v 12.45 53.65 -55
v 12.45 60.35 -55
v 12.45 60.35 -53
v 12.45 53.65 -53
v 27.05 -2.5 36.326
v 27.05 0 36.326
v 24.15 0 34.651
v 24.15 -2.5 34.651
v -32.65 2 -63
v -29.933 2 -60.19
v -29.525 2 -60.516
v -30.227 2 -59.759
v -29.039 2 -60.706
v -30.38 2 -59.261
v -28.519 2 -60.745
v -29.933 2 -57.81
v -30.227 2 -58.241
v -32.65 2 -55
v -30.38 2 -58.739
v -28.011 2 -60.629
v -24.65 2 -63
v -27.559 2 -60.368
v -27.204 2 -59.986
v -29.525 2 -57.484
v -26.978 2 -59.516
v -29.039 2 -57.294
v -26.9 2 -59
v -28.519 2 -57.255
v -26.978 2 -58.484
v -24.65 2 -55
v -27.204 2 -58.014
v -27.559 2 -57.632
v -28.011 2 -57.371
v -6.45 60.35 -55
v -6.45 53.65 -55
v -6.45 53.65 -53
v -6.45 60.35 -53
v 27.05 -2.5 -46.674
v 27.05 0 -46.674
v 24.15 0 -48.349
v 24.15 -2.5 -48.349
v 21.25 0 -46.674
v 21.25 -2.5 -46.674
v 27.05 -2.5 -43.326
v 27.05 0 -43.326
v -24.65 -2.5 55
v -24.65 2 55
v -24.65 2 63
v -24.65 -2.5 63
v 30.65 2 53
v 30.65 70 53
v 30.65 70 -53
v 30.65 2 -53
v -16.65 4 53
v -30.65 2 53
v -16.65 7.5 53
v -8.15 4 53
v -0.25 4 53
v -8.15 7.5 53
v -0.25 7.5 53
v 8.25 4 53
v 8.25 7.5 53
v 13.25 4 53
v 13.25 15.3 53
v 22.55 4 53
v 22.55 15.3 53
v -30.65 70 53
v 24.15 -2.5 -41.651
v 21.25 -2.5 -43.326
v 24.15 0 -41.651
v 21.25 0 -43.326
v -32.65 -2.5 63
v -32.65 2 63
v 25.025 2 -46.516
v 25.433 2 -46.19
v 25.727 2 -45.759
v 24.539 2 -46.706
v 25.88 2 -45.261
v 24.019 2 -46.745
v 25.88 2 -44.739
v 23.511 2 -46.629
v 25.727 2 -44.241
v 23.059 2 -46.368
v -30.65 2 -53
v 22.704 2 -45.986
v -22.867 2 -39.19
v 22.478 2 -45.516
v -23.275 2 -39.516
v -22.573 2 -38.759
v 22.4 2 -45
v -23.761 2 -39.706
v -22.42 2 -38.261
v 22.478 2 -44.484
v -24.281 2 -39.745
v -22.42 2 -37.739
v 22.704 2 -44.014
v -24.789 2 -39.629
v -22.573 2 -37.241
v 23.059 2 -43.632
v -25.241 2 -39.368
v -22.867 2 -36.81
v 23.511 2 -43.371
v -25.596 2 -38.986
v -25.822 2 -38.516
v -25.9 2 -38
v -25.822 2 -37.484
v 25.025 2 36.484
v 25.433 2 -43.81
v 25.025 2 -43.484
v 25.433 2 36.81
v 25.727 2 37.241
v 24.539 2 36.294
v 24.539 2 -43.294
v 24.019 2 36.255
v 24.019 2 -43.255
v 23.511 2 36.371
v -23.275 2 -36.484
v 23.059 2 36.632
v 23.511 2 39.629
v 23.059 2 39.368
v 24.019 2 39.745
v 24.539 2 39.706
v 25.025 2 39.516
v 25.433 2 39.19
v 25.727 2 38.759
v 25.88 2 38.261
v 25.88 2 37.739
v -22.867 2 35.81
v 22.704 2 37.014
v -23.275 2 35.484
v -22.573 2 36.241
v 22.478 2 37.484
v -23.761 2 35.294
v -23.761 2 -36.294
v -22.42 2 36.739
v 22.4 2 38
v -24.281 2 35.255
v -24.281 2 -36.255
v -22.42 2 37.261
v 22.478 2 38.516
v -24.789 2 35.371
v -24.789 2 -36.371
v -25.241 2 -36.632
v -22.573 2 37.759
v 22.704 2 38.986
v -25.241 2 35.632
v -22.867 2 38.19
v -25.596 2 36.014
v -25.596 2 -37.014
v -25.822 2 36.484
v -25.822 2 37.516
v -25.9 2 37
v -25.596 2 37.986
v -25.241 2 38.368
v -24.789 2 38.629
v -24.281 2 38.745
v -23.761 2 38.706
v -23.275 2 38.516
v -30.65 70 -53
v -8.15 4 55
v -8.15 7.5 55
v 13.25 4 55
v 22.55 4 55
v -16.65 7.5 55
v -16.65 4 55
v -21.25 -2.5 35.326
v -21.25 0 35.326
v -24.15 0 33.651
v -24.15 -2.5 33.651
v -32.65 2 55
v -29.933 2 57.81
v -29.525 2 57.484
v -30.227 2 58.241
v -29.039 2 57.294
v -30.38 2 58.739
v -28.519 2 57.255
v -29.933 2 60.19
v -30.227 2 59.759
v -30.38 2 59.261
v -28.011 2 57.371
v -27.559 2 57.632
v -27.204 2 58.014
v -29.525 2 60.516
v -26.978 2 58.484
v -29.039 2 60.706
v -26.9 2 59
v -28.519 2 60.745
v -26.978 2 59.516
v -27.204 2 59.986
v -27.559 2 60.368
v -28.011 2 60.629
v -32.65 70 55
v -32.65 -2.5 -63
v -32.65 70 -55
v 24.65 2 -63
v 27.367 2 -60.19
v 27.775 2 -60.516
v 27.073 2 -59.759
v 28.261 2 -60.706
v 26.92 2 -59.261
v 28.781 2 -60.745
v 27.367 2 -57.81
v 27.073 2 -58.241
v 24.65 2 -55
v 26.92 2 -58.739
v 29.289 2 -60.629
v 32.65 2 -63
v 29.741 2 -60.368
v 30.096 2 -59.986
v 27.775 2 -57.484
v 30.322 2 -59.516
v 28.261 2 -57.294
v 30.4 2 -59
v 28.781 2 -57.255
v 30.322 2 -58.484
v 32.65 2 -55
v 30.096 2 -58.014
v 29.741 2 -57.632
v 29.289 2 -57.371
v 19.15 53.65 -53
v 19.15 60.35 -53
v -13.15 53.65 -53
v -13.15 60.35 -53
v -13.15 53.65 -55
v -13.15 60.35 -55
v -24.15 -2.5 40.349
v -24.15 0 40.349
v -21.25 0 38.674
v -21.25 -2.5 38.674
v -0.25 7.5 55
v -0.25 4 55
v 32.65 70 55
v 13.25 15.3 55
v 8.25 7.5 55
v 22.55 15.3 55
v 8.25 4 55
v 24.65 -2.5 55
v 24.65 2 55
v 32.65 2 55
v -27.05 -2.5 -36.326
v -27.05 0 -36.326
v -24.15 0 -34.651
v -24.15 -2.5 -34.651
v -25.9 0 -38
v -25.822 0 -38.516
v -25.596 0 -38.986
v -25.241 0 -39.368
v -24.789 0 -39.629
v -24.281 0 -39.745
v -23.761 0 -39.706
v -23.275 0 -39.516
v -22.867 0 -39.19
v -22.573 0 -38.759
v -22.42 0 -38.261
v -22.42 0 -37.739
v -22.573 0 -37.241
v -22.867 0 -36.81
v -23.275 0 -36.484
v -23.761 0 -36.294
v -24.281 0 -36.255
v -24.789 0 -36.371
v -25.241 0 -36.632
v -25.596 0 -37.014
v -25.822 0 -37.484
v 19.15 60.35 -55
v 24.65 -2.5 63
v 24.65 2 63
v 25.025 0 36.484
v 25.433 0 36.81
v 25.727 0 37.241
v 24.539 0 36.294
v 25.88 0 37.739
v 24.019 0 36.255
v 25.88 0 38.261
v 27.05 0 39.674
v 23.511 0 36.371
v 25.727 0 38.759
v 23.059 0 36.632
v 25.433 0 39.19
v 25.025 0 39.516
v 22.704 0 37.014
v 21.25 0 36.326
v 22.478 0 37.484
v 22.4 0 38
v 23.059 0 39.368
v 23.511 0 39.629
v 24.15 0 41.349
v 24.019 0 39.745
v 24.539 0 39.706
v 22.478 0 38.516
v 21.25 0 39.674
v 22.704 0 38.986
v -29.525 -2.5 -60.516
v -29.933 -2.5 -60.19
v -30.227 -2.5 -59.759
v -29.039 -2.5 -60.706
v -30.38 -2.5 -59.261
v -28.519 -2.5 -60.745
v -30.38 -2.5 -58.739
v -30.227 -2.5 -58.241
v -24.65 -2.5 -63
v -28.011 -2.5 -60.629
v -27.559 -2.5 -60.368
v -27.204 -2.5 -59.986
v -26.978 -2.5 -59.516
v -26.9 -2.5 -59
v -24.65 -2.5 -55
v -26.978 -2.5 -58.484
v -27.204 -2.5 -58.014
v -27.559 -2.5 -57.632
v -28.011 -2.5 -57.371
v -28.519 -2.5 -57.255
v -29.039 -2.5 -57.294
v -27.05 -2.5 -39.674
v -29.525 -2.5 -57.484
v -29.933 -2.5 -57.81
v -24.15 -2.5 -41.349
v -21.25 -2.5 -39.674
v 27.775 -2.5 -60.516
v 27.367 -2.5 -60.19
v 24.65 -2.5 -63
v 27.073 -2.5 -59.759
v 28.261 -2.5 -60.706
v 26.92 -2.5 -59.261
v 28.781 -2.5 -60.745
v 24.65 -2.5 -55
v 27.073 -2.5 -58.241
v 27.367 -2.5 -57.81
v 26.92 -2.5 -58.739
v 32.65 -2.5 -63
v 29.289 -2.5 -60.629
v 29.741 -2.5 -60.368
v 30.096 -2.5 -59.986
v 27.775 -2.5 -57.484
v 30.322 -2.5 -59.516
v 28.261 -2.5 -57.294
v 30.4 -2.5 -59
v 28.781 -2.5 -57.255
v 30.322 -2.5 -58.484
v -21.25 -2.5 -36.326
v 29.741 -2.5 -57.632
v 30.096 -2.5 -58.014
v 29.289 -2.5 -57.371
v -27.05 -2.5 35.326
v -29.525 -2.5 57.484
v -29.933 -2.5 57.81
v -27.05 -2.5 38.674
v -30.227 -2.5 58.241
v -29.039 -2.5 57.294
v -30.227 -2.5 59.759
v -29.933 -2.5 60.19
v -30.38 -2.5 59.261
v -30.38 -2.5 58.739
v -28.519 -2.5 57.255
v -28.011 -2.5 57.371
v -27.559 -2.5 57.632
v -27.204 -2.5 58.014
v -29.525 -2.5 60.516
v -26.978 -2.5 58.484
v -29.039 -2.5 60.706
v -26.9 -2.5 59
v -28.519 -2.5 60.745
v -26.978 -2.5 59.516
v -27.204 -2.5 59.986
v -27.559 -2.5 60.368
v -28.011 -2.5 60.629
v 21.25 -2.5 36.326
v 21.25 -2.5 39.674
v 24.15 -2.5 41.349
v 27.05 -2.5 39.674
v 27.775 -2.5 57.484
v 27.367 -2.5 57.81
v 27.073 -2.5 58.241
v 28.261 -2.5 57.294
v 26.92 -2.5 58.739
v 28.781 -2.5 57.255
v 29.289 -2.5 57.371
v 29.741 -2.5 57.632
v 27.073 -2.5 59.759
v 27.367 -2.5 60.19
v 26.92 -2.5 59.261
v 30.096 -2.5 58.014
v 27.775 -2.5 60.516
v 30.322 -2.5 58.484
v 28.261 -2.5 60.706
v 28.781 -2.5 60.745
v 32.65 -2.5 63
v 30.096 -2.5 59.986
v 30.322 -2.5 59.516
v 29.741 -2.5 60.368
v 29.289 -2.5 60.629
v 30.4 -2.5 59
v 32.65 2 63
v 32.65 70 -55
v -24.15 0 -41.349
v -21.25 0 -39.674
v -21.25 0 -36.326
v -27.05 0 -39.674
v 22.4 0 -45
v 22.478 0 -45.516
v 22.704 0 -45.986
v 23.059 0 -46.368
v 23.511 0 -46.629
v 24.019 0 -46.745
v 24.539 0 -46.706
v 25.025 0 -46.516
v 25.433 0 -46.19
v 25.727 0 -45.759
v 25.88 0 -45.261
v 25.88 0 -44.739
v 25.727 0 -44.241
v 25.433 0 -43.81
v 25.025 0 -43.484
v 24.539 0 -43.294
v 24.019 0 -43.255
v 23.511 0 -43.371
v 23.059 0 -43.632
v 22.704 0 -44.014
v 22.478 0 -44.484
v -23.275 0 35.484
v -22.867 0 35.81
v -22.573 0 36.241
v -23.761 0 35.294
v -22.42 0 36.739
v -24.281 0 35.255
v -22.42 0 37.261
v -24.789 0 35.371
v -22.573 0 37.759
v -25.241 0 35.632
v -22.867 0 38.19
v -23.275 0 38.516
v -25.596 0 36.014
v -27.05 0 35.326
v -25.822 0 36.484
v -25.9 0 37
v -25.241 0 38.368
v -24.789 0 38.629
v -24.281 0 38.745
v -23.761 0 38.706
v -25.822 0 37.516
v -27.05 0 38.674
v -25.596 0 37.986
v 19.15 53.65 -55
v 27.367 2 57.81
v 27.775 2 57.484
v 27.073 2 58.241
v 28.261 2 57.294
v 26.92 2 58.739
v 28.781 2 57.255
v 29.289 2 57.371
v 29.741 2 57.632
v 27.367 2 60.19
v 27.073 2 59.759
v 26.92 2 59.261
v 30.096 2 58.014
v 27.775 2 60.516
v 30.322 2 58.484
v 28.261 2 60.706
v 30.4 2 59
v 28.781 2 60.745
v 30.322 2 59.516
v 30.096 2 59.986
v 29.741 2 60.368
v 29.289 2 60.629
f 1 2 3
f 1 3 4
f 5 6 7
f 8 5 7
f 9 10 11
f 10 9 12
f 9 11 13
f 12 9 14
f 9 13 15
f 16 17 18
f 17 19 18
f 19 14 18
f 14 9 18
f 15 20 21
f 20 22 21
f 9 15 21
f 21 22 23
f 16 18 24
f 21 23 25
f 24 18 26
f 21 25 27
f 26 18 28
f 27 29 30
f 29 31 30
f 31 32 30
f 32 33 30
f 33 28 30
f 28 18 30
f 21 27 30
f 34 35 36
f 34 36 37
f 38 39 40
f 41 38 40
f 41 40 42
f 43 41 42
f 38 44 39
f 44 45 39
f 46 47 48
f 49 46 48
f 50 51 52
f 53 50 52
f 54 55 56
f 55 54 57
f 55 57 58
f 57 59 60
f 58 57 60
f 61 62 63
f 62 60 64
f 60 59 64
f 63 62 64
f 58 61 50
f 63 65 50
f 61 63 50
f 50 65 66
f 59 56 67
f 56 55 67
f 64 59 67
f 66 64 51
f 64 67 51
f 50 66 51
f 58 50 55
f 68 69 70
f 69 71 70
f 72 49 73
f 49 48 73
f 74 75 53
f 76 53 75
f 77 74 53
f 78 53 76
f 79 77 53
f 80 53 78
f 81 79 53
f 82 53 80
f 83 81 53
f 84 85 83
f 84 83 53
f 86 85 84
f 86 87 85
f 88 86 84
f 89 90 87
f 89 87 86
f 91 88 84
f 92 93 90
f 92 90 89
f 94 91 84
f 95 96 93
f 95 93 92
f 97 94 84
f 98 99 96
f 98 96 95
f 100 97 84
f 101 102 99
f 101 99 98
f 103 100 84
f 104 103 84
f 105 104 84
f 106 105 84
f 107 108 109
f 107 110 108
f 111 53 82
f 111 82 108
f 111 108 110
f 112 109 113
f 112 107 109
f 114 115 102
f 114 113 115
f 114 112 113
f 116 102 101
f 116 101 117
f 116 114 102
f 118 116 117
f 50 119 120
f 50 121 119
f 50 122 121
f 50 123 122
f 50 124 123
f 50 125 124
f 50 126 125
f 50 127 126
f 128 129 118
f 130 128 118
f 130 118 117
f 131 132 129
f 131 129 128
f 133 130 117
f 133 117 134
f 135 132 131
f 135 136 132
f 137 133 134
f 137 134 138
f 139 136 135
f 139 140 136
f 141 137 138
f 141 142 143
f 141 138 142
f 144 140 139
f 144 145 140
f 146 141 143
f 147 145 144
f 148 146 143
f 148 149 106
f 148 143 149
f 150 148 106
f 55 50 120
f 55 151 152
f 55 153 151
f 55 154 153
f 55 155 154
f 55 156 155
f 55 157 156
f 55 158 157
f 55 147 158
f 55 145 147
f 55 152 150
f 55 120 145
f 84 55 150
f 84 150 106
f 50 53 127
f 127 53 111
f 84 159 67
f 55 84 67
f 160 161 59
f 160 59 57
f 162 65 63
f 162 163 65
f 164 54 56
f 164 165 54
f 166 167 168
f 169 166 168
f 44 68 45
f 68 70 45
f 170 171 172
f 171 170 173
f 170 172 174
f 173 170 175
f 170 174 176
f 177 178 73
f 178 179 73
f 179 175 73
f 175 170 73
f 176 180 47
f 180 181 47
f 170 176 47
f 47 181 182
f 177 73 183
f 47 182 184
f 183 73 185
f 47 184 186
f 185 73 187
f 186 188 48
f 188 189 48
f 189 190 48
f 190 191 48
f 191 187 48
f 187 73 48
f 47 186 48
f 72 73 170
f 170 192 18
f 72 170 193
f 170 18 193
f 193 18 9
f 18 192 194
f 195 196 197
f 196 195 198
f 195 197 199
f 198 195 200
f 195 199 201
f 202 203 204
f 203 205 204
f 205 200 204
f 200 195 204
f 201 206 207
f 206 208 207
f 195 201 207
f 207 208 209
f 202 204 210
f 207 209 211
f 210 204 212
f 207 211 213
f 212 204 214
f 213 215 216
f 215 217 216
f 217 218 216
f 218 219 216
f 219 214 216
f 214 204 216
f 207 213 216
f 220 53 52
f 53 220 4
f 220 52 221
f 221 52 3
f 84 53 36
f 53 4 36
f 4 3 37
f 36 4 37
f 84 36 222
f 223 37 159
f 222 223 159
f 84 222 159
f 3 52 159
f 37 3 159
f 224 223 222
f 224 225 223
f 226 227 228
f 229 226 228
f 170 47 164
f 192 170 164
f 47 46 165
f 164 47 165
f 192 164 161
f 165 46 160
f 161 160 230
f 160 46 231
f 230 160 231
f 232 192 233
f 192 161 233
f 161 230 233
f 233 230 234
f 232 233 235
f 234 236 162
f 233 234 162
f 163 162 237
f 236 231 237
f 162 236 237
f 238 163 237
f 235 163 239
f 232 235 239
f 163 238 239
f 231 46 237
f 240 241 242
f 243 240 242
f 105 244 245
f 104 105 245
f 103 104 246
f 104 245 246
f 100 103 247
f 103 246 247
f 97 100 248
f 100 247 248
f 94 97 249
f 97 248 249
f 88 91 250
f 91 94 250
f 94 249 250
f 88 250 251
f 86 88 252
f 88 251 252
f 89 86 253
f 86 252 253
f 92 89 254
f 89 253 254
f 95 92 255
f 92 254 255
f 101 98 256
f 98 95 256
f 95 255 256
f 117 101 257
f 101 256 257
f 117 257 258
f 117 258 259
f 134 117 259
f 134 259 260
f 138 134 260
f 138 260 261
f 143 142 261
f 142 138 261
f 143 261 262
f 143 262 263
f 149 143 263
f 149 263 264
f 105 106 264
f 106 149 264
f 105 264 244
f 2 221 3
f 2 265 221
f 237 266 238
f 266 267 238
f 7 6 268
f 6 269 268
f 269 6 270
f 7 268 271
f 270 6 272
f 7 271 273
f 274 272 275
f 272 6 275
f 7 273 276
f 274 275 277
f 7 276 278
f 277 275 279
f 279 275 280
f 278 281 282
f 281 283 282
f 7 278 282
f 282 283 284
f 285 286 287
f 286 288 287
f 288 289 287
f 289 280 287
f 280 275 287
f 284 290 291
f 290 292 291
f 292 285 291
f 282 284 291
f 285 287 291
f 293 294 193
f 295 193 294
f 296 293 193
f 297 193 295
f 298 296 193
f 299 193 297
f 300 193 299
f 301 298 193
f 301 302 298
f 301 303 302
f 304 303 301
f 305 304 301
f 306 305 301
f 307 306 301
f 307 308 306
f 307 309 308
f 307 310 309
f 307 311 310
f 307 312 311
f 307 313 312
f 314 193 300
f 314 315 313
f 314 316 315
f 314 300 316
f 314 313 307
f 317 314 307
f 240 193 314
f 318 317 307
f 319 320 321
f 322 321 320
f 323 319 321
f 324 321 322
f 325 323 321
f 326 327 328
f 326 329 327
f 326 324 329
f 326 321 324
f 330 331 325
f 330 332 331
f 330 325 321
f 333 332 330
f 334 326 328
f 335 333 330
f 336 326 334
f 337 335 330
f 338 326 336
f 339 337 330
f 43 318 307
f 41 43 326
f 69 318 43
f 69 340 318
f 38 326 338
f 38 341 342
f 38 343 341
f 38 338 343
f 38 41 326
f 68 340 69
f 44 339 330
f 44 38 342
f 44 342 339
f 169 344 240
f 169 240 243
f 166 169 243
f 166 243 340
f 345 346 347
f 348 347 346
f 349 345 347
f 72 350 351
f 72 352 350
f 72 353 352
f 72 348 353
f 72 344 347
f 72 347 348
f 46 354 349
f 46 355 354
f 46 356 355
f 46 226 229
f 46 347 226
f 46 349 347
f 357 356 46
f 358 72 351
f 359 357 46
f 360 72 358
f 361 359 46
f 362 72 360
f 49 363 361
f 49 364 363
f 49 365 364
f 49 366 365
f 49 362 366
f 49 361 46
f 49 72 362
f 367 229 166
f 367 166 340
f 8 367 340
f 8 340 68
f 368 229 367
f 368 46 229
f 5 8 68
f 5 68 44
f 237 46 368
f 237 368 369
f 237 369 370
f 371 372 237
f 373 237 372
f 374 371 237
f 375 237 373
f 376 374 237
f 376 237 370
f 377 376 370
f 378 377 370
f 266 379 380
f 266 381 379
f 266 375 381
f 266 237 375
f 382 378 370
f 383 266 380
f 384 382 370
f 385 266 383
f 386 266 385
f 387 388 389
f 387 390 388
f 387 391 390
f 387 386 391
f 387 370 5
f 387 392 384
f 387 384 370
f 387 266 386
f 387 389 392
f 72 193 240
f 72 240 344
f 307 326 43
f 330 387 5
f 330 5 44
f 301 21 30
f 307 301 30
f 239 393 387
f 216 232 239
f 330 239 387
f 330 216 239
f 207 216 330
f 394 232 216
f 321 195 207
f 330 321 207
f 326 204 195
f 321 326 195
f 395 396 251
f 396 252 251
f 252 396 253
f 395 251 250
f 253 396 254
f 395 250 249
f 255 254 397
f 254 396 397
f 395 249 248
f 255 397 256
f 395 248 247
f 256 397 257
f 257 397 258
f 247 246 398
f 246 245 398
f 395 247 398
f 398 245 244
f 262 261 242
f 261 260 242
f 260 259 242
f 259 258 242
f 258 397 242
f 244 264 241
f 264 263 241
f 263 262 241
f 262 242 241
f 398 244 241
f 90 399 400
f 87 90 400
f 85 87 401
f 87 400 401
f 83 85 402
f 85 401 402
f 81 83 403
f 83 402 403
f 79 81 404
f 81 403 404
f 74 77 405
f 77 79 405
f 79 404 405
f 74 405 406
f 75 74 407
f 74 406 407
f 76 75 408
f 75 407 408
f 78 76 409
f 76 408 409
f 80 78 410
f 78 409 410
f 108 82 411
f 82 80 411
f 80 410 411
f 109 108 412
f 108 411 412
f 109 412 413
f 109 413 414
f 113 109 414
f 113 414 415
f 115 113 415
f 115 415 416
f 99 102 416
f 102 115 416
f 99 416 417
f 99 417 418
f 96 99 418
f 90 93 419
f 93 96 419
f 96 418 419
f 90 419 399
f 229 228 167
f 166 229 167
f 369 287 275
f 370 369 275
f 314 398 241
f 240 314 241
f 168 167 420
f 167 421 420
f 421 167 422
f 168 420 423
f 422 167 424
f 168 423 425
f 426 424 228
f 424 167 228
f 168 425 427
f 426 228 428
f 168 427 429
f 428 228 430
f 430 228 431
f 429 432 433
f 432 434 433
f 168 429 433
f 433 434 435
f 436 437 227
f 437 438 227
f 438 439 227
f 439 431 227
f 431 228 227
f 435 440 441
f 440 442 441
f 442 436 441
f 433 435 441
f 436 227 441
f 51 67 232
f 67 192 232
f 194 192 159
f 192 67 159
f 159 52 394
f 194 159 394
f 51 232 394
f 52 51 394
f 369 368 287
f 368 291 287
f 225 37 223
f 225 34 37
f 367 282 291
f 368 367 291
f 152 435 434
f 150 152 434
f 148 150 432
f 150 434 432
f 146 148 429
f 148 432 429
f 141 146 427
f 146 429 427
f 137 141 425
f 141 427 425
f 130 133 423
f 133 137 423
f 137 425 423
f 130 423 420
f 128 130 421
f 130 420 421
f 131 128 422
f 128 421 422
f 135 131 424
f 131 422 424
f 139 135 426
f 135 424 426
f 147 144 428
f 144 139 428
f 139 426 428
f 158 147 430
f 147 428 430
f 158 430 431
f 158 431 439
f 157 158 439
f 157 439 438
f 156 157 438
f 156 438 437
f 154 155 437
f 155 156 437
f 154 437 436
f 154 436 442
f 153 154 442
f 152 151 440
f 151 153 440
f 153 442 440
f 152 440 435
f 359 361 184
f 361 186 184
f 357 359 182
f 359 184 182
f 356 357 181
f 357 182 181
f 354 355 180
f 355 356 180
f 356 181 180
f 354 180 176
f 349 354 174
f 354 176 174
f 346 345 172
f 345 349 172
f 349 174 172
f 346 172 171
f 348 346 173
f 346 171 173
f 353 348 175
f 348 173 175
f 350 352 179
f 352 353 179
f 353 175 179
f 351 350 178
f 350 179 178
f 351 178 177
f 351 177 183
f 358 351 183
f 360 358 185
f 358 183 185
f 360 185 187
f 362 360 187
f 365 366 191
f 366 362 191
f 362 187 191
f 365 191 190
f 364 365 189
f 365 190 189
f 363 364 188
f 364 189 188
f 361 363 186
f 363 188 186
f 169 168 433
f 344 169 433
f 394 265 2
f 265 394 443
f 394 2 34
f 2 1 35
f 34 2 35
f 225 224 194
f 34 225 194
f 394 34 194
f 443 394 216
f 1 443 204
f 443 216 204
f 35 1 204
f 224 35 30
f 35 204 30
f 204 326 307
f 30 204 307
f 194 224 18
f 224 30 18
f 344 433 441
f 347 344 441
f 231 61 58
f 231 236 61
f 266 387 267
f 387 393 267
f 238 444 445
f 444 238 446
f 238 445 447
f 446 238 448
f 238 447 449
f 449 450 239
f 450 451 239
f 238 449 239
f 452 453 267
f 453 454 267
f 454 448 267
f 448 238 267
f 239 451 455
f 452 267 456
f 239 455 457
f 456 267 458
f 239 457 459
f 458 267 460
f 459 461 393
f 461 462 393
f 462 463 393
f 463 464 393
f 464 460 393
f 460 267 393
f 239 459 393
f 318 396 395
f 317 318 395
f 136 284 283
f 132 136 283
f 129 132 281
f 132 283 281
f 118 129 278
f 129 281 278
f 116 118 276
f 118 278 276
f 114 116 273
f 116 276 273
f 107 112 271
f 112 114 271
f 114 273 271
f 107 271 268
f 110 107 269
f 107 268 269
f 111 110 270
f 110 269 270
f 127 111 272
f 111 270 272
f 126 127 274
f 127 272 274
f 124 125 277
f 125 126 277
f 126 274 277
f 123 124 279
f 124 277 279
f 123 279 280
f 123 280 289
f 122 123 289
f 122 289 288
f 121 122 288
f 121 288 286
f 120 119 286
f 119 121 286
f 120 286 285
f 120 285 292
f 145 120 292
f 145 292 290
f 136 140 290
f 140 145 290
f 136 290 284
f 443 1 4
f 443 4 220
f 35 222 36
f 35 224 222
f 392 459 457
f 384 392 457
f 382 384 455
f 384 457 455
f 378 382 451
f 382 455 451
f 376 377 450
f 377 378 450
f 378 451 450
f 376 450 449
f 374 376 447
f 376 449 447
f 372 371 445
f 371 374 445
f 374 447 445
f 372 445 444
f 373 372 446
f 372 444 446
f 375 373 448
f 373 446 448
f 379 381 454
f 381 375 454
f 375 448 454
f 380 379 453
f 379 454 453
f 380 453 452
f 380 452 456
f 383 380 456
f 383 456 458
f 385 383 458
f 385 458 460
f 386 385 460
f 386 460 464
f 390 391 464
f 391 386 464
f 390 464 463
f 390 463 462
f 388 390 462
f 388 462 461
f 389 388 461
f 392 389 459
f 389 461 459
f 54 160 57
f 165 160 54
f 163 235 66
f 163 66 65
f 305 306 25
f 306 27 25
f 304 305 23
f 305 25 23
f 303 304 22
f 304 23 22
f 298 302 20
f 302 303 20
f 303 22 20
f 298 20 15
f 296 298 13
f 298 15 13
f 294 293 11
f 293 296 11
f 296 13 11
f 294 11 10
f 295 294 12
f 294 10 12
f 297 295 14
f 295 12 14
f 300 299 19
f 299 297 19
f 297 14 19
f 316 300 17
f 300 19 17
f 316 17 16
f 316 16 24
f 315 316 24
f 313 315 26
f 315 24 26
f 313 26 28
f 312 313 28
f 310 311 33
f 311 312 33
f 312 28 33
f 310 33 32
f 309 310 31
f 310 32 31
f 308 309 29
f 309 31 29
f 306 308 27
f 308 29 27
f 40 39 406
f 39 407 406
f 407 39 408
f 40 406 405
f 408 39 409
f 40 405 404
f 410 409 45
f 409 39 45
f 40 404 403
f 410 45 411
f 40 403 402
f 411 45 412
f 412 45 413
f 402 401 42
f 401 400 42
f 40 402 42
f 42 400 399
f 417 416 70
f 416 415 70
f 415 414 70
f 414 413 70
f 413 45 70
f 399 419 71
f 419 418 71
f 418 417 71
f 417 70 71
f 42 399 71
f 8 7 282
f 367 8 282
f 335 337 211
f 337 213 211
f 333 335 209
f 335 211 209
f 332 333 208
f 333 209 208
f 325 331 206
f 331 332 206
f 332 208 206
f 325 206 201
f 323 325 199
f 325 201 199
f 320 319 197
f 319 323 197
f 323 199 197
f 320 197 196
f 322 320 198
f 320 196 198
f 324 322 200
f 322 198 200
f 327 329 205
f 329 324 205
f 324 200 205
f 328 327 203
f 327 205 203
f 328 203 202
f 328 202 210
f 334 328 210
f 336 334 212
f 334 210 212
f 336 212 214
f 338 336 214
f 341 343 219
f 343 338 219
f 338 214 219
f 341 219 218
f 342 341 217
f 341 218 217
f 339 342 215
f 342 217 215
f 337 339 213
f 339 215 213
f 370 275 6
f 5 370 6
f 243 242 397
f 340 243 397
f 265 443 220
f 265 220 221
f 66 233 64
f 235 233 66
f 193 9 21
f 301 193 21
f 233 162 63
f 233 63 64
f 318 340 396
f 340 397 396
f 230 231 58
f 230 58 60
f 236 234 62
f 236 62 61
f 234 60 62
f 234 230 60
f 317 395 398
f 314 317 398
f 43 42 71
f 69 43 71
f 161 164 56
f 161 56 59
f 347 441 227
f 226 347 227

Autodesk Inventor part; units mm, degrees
ref_plane "YZ Plane" through (0, 0, 0) normal (1, 0, 0) x (0, 1, 0)
ref_plane "XZ Plane" through (0, 0, 0) normal (0, 1, 0) x (-1, 0, 0)
ref_plane "XY Plane" through (0, 0, 0) normal (0, 0, 1) x (1, 0, 0)
sketch "Sketch1" plane through (0, 0, 0) normal (0, 1, 0) x (-1, 0, 0)
  line L0 (32.65, 55) -> (-32.65, 55)
  line L1 (-32.65, 55) -> (-32.65, -55)
  line L2 (-32.65, -55) -> (32.65, -55)
  line L3 (32.65, -55) -> (32.65, 55)
  line L4 (32.65, 55) -> (-32.65, -55) construction
  line L5 (-32.65, 55) -> (32.65, -55) construction
  circle A0 centre (-24.15, 38) radius 1.75
  circle A1 centre (-24.15, -45) radius 1.75
  circle A2 centre (24.15, 37) radius 1.75
  circle A3 centre (24.15, -38) radius 1.75
  point P0 (0, 0)
  dimension "d0" = 110
  dimension "d1" = 65.3
  dimension "d2" = 83
  dimension "d3" = 8.5
  dimension "d4" = 17
  dimension "d5" = 3.5
  dimension "d6" = 3.5
  dimension "d7" = 3.5
  dimension "d8" = 1
  dimension "d9" = 48.3
  dimension "d10" = 3.5
  dimension "d11" = 75
extrude "Extrusion1" add sketch "Sketch1" along normal blind 2
sketch "Sketch2" plane through (-32.65, 0, 55) normal (0, 0, 1) x (1, 0, 0)
  line L0 (0, 70) -> (65.3, 70)
  line L1 (65.3, 70) -> (65.3, 0)
  line L2 (65.3, 0) -> (0, 0)
  line L3 (0, 0) -> (0, 70)
  line L4 (0, 70) -> (65.3, 0) construction
  line L5 (65.3, 70) -> (0, 0) construction
  line L6 (65.3, 0) -> (65.3, 2) projected
  line L7 (16, 7.5) -> (24.5, 7.5)
  line L8 (24.5, 7.5) -> (24.5, 4)
  line L9 (24.5, 4) -> (16, 4)
  line L10 (16, 4) -> (16, 7.5)
  line L11 (16, 7.5) -> (24.5, 4) construction
  line L12 (24.5, 7.5) -> (16, 4) construction
  line L13 (32.4, 7.5) -> (40.9, 7.5)
  line L14 (40.9, 7.5) -> (40.9, 4)
  line L15 (40.9, 4) -> (32.4, 4)
  line L16 (32.4, 4) -> (32.4, 7.5)
  line L17 (32.4, 7.5) -> (40.9, 4) construction
  line L18 (40.9, 7.5) -> (32.4, 4) construction
  line L19 (45.9, 15.3) -> (55.2, 15.3)
  line L20 (55.2, 15.3) -> (55.2, 4)
  line L21 (55.2, 4) -> (45.9, 4)
  line L22 (45.9, 4) -> (45.9, 15.3)
  line L23 (45.9, 15.3) -> (55.2, 4) construction
  line L24 (55.2, 15.3) -> (45.9, 4) construction
  line L25 (0, 2) -> (65.3, 2) projected
  point P0 (32.65, 0)
  point P1 (32.65, 35)
  point P2 (20.25, 5.75)
  point P3 (36.65, 5.75)
  point P4 (50.55, 9.65)
  point P5 (45.9, 9.65)
  dimension "d14" = 70
  dimension "d15" = 11.3
  dimension "d16" = 9.3
  dimension "d17" = 8.5
  dimension "d18" = 3.5
  dimension "d19" = 8.5
  dimension "d20" = 3.5
  dimension "d21" = 2
  dimension "d22" = 7.9
  dimension "d23" = 16
  dimension "d24" = 5
extrude "Extrusion2" add sketch "Sketch2" against normal blind 2 contours L0 L1 L25 L3
sketch "Sketch3" plane through (32.65, 0, 55) normal (1, 0, 0) x (0, 0, -1)
  line L0 (110, 0) -> (110, 2) projected
  line L1 (0, 70) -> (110, 70)
  line L2 (110, 70) -> (110, 0)
  line L3 (110, 0) -> (0, 0)
  line L4 (0, 0) -> (0, 70)
  line L5 (0, 70) -> (110, 0) construction
  line L6 (110, 70) -> (0, 0) construction
  point P0 (55, 0)
  point P1 (55, 35)
  point P2 (0, 70)
extrude "Extrusion3" add sketch "Sketch3" against normal blind 2
sketch "Sketch4" plane through (-32.65, 0, -55) normal (-1, 0, 0) x (0, 0, 1)
  line L0 (110, 0) -> (110, 70) projected
  line L1 (0, 70) -> (110, 70)
  line L2 (110, 70) -> (110, 0)
  line L3 (110, 0) -> (0, 0)
  line L4 (0, 0) -> (0, 70)
  line L5 (0, 70) -> (110, 0) construction
  line L6 (110, 70) -> (0, 0) construction
  point P0 (55, 0)
  point P1 (55, 35)
  point P2 (0, 70)
extrude "Extrusion4" add sketch "Sketch4" against normal blind 2
sketch "Sketch5" plane through (32.65, 0, -55) normal (0, 0, -1) x (-1, 0, 0)
  line L0 (65.3, 0) -> (65.3, 70) projected
  line L1 (0, 70) -> (65.3, 70)
  line L2 (65.3, 70) -> (65.3, 0)
  line L3 (65.3, 0) -> (0, 0)
  line L4 (0, 0) -> (0, 70)
  line L5 (0, 70) -> (65.3, 0) construction
  line L6 (65.3, 70) -> (0, 0) construction
  line L7 (13.5, 60.35) -> (20.2, 60.35)
  line L8 (20.2, 60.35) -> (20.2, 53.65)
  line L9 (20.2, 53.65) -> (13.5, 53.65)
  line L10 (13.5, 53.65) -> (13.5, 60.35)
  line L11 (13.5, 60.35) -> (20.2, 53.65) construction
  line L12 (20.2, 60.35) -> (13.5, 53.65) construction
  line L13 (39.1, 60.35) -> (45.8, 60.35)
  line L14 (45.8, 60.35) -> (45.8, 53.65)
  line L15 (45.8, 53.65) -> (39.1, 53.65)
  line L16 (39.1, 53.65) -> (39.1, 60.35)
  line L17 (39.1, 60.35) -> (45.8, 53.65) construction
  line L18 (45.8, 60.35) -> (39.1, 53.65) construction
  line L19 (2, 2) -> (63.3, 2) projected
  point P0 (32.65, 0)
  point P1 (32.65, 35)
  point P2 (16.85, 57)
  point P3 (42.45, 57)
  point P4 (20.2, 57)
  point P5 (39.1, 57)
  point P6 (45.8, 57)
  dimension "d31" = 6.7
  dimension "d32" = 6.7
  dimension "d33" = 6.7
  dimension "d34" = 6.7
  dimension "d35" = 18.9
  dimension "d36" = 13.5
  dimension "d38" = 55
  dimension "d39" = 19.5
extrude "Extrusion5" add sketch "Sketch5" against normal blind 2
sketch "Sketch6" plane through (0, 0, 0) normal (0, -1, 0) x (1, 0, 0)
  line L0 (-32.65, -55) -> (32.65, -55) projected
  line L1 (-24.65, -63) -> (-32.65, -63)
  line L2 (-32.65, -63) -> (-32.65, -55)
  line L3 (-32.65, -55) -> (-24.65, -55)
  line L4 (-24.65, -55) -> (-24.65, -63)
  line L5 (-24.65, -63) -> (-32.65, -55) construction
  line L6 (-32.65, -63) -> (-24.65, -55) construction
  line L7 (0, 0) -> (-42.6536, 0) construction
  line L8 (0, 0) -> (0, 77.6951) construction
  line L9 (-24.65, 63) -> (-32.65, 63)
  line L10 (-32.65, 63) -> (-32.65, 55)
  line L11 (-32.65, 55) -> (-24.65, 55)
  line L12 (-24.65, 55) -> (-24.65, 63)
  line L13 (-24.65, 63) -> (-32.65, 55) construction
  line L14 (-32.65, 63) -> (-24.65, 55) construction
  line L15 (24.65, -63) -> (32.65, -63)
  line L16 (32.65, -63) -> (32.65, -55)
  line L17 (32.65, -55) -> (24.65, -55)
  line L18 (24.65, -55) -> (24.65, -63)
  line L19 (24.65, -63) -> (32.65, -55) construction
  line L20 (32.65, -63) -> (24.65, -55) construction
  line L21 (24.65, 63) -> (32.65, 63)
  line L22 (32.65, 63) -> (32.65, 55)
  line L23 (32.65, 55) -> (24.65, 55)
  line L24 (24.65, 55) -> (24.65, 63)
  line L25 (24.65, 63) -> (32.65, 55) construction
  line L26 (32.65, 63) -> (24.65, 55) construction
  circle A0 centre (-28.65, -59) radius 1.75
  circle A1 centre (-28.65, 59) radius 1.75
  circle A2 centre (28.65, -59) radius 1.75
  circle A3 centre (28.65, 59) radius 1.75
  point P0 (-28.65, 59)
  point P1 (28.65, 59)
  dimension "d42" = 8
  dimension "d43" = 8
  dimension "d44" = 3.5
extrude "Extrusion6" add sketch "Sketch6" against normal blind 2
sketch "Sketch7" plane through (0, 0, 0) normal (0, -1, 0) x (1, 0, 0)
  circle A0 centre (-24.15, -38) radius 1.75 projected
  line L0 (-24.15, -34.6514) -> (-21.25, -36.3257)
  line L1 (-21.25, -36.3257) -> (-21.25, -39.6743)
  line L2 (-21.25, -39.6743) -> (-24.15, -41.3486)
  line L3 (-24.15, -41.3486) -> (-27.05, -39.6743)
  line L4 (-27.05, -39.6743) -> (-27.05, -36.3257)
  line L5 (-27.05, -36.3257) -> (-24.15, -34.6514)
  circle A1 centre (-24.15, 37) radius 1.75 projected
  line L6 (-24.15, 40.3486) -> (-21.25, 38.6743)
  line L7 (-21.25, 38.6743) -> (-21.25, 35.3257)
  line L8 (-21.25, 35.3257) -> (-24.15, 33.6514)
  line L9 (-24.15, 33.6514) -> (-27.05, 35.3257)
  line L10 (-27.05, 35.3257) -> (-27.05, 38.6743)
  line L11 (-27.05, 38.6743) -> (-24.15, 40.3486)
  circle A2 centre (24.15, 38) radius 1.75 projected
  line L12 (24.15, 41.3486) -> (27.05, 39.6743)
  line L13 (27.05, 39.6743) -> (27.05, 36.3257)
  line L14 (27.05, 36.3257) -> (24.15, 34.6514)
  line L15 (24.15, 34.6514) -> (21.25, 36.3257)
  line L16 (21.25, 36.3257) -> (21.25, 39.6743)
  line L17 (21.25, 39.6743) -> (24.15, 41.3486)
  circle A3 centre (24.15, -45) radius 1.75 projected
  line L18 (24.15, -41.6514) -> (27.05, -43.3257)
  line L19 (27.05, -43.3257) -> (27.05, -46.6743)
  line L20 (27.05, -46.6743) -> (24.15, -48.3486)
  line L21 (24.15, -48.3486) -> (21.25, -46.6743)
  line L22 (21.25, -46.6743) -> (21.25, -43.3257)
  line L23 (21.25, -43.3257) -> (24.15, -41.6514)
  circle A4 centre (-28.65, 59) radius 1.75 projected
  circle A5 centre (28.65, -59) radius 1.75 projected
  circle A6 centre (28.65, 59) radius 1.75 projected
  circle A7 centre (-28.65, -59) radius 1.75 projected
  circle A8 centre (-24.15, -38) radius 1.75 projected
  circle A9 centre (-24.15, 37) radius 1.75 projected
  circle A10 centre (24.15, -45) radius 1.75 projected
  circle A11 centre (24.15, 38) radius 1.75 projected
  line L24 (32.65, 63) -> (32.65, -63) projected
  line L25 (32.65, 63) -> (24.65, 63) projected
  line L26 (24.65, 63) -> (24.65, 55) projected
  line L27 (-24.65, 55) -> (24.65, 55) projected
  line L28 (-24.65, 55) -> (-24.65, 63) projected
  line L29 (-24.65, 63) -> (-32.65, 63) projected
  line L30 (-32.65, 63) -> (-32.65, -63) projected
  line L31 (-32.65, -63) -> (-24.65, -63) projected
  line L32 (-24.65, -63) -> (-24.65, -55) projected
  line L33 (24.65, -55) -> (-24.65, -55) projected
  line L34 (24.65, -55) -> (24.65, -63) projected
  line L35 (24.65, -63) -> (32.65, -63) projected
  point P0 (0, 0)
  point P1 (27.05, 38)
  point P2 (21.25, 38)
  point P3 (27.05, -45)
  point P4 (21.25, -45)
  dimension "d47" = 5.8
  dimension "d48" = 5.8
  dimension "d49" = 5.8
  dimension "d50" = 5.8
extrude "Extrusion7" add sketch "Sketch7" along normal blind 2.5 contours L24 L35 L34 L33 L32 L31 L30 L29 L28 L27 L26 L25
equation "\"d6\" = d5"
equation "\"d7\" = d5"
equation "\"d10\" = d5"
equation "\"d48\" = d47"
equation "\"d49\" = d47"
equation "\"d50\" = d47"
properties part number "base"
